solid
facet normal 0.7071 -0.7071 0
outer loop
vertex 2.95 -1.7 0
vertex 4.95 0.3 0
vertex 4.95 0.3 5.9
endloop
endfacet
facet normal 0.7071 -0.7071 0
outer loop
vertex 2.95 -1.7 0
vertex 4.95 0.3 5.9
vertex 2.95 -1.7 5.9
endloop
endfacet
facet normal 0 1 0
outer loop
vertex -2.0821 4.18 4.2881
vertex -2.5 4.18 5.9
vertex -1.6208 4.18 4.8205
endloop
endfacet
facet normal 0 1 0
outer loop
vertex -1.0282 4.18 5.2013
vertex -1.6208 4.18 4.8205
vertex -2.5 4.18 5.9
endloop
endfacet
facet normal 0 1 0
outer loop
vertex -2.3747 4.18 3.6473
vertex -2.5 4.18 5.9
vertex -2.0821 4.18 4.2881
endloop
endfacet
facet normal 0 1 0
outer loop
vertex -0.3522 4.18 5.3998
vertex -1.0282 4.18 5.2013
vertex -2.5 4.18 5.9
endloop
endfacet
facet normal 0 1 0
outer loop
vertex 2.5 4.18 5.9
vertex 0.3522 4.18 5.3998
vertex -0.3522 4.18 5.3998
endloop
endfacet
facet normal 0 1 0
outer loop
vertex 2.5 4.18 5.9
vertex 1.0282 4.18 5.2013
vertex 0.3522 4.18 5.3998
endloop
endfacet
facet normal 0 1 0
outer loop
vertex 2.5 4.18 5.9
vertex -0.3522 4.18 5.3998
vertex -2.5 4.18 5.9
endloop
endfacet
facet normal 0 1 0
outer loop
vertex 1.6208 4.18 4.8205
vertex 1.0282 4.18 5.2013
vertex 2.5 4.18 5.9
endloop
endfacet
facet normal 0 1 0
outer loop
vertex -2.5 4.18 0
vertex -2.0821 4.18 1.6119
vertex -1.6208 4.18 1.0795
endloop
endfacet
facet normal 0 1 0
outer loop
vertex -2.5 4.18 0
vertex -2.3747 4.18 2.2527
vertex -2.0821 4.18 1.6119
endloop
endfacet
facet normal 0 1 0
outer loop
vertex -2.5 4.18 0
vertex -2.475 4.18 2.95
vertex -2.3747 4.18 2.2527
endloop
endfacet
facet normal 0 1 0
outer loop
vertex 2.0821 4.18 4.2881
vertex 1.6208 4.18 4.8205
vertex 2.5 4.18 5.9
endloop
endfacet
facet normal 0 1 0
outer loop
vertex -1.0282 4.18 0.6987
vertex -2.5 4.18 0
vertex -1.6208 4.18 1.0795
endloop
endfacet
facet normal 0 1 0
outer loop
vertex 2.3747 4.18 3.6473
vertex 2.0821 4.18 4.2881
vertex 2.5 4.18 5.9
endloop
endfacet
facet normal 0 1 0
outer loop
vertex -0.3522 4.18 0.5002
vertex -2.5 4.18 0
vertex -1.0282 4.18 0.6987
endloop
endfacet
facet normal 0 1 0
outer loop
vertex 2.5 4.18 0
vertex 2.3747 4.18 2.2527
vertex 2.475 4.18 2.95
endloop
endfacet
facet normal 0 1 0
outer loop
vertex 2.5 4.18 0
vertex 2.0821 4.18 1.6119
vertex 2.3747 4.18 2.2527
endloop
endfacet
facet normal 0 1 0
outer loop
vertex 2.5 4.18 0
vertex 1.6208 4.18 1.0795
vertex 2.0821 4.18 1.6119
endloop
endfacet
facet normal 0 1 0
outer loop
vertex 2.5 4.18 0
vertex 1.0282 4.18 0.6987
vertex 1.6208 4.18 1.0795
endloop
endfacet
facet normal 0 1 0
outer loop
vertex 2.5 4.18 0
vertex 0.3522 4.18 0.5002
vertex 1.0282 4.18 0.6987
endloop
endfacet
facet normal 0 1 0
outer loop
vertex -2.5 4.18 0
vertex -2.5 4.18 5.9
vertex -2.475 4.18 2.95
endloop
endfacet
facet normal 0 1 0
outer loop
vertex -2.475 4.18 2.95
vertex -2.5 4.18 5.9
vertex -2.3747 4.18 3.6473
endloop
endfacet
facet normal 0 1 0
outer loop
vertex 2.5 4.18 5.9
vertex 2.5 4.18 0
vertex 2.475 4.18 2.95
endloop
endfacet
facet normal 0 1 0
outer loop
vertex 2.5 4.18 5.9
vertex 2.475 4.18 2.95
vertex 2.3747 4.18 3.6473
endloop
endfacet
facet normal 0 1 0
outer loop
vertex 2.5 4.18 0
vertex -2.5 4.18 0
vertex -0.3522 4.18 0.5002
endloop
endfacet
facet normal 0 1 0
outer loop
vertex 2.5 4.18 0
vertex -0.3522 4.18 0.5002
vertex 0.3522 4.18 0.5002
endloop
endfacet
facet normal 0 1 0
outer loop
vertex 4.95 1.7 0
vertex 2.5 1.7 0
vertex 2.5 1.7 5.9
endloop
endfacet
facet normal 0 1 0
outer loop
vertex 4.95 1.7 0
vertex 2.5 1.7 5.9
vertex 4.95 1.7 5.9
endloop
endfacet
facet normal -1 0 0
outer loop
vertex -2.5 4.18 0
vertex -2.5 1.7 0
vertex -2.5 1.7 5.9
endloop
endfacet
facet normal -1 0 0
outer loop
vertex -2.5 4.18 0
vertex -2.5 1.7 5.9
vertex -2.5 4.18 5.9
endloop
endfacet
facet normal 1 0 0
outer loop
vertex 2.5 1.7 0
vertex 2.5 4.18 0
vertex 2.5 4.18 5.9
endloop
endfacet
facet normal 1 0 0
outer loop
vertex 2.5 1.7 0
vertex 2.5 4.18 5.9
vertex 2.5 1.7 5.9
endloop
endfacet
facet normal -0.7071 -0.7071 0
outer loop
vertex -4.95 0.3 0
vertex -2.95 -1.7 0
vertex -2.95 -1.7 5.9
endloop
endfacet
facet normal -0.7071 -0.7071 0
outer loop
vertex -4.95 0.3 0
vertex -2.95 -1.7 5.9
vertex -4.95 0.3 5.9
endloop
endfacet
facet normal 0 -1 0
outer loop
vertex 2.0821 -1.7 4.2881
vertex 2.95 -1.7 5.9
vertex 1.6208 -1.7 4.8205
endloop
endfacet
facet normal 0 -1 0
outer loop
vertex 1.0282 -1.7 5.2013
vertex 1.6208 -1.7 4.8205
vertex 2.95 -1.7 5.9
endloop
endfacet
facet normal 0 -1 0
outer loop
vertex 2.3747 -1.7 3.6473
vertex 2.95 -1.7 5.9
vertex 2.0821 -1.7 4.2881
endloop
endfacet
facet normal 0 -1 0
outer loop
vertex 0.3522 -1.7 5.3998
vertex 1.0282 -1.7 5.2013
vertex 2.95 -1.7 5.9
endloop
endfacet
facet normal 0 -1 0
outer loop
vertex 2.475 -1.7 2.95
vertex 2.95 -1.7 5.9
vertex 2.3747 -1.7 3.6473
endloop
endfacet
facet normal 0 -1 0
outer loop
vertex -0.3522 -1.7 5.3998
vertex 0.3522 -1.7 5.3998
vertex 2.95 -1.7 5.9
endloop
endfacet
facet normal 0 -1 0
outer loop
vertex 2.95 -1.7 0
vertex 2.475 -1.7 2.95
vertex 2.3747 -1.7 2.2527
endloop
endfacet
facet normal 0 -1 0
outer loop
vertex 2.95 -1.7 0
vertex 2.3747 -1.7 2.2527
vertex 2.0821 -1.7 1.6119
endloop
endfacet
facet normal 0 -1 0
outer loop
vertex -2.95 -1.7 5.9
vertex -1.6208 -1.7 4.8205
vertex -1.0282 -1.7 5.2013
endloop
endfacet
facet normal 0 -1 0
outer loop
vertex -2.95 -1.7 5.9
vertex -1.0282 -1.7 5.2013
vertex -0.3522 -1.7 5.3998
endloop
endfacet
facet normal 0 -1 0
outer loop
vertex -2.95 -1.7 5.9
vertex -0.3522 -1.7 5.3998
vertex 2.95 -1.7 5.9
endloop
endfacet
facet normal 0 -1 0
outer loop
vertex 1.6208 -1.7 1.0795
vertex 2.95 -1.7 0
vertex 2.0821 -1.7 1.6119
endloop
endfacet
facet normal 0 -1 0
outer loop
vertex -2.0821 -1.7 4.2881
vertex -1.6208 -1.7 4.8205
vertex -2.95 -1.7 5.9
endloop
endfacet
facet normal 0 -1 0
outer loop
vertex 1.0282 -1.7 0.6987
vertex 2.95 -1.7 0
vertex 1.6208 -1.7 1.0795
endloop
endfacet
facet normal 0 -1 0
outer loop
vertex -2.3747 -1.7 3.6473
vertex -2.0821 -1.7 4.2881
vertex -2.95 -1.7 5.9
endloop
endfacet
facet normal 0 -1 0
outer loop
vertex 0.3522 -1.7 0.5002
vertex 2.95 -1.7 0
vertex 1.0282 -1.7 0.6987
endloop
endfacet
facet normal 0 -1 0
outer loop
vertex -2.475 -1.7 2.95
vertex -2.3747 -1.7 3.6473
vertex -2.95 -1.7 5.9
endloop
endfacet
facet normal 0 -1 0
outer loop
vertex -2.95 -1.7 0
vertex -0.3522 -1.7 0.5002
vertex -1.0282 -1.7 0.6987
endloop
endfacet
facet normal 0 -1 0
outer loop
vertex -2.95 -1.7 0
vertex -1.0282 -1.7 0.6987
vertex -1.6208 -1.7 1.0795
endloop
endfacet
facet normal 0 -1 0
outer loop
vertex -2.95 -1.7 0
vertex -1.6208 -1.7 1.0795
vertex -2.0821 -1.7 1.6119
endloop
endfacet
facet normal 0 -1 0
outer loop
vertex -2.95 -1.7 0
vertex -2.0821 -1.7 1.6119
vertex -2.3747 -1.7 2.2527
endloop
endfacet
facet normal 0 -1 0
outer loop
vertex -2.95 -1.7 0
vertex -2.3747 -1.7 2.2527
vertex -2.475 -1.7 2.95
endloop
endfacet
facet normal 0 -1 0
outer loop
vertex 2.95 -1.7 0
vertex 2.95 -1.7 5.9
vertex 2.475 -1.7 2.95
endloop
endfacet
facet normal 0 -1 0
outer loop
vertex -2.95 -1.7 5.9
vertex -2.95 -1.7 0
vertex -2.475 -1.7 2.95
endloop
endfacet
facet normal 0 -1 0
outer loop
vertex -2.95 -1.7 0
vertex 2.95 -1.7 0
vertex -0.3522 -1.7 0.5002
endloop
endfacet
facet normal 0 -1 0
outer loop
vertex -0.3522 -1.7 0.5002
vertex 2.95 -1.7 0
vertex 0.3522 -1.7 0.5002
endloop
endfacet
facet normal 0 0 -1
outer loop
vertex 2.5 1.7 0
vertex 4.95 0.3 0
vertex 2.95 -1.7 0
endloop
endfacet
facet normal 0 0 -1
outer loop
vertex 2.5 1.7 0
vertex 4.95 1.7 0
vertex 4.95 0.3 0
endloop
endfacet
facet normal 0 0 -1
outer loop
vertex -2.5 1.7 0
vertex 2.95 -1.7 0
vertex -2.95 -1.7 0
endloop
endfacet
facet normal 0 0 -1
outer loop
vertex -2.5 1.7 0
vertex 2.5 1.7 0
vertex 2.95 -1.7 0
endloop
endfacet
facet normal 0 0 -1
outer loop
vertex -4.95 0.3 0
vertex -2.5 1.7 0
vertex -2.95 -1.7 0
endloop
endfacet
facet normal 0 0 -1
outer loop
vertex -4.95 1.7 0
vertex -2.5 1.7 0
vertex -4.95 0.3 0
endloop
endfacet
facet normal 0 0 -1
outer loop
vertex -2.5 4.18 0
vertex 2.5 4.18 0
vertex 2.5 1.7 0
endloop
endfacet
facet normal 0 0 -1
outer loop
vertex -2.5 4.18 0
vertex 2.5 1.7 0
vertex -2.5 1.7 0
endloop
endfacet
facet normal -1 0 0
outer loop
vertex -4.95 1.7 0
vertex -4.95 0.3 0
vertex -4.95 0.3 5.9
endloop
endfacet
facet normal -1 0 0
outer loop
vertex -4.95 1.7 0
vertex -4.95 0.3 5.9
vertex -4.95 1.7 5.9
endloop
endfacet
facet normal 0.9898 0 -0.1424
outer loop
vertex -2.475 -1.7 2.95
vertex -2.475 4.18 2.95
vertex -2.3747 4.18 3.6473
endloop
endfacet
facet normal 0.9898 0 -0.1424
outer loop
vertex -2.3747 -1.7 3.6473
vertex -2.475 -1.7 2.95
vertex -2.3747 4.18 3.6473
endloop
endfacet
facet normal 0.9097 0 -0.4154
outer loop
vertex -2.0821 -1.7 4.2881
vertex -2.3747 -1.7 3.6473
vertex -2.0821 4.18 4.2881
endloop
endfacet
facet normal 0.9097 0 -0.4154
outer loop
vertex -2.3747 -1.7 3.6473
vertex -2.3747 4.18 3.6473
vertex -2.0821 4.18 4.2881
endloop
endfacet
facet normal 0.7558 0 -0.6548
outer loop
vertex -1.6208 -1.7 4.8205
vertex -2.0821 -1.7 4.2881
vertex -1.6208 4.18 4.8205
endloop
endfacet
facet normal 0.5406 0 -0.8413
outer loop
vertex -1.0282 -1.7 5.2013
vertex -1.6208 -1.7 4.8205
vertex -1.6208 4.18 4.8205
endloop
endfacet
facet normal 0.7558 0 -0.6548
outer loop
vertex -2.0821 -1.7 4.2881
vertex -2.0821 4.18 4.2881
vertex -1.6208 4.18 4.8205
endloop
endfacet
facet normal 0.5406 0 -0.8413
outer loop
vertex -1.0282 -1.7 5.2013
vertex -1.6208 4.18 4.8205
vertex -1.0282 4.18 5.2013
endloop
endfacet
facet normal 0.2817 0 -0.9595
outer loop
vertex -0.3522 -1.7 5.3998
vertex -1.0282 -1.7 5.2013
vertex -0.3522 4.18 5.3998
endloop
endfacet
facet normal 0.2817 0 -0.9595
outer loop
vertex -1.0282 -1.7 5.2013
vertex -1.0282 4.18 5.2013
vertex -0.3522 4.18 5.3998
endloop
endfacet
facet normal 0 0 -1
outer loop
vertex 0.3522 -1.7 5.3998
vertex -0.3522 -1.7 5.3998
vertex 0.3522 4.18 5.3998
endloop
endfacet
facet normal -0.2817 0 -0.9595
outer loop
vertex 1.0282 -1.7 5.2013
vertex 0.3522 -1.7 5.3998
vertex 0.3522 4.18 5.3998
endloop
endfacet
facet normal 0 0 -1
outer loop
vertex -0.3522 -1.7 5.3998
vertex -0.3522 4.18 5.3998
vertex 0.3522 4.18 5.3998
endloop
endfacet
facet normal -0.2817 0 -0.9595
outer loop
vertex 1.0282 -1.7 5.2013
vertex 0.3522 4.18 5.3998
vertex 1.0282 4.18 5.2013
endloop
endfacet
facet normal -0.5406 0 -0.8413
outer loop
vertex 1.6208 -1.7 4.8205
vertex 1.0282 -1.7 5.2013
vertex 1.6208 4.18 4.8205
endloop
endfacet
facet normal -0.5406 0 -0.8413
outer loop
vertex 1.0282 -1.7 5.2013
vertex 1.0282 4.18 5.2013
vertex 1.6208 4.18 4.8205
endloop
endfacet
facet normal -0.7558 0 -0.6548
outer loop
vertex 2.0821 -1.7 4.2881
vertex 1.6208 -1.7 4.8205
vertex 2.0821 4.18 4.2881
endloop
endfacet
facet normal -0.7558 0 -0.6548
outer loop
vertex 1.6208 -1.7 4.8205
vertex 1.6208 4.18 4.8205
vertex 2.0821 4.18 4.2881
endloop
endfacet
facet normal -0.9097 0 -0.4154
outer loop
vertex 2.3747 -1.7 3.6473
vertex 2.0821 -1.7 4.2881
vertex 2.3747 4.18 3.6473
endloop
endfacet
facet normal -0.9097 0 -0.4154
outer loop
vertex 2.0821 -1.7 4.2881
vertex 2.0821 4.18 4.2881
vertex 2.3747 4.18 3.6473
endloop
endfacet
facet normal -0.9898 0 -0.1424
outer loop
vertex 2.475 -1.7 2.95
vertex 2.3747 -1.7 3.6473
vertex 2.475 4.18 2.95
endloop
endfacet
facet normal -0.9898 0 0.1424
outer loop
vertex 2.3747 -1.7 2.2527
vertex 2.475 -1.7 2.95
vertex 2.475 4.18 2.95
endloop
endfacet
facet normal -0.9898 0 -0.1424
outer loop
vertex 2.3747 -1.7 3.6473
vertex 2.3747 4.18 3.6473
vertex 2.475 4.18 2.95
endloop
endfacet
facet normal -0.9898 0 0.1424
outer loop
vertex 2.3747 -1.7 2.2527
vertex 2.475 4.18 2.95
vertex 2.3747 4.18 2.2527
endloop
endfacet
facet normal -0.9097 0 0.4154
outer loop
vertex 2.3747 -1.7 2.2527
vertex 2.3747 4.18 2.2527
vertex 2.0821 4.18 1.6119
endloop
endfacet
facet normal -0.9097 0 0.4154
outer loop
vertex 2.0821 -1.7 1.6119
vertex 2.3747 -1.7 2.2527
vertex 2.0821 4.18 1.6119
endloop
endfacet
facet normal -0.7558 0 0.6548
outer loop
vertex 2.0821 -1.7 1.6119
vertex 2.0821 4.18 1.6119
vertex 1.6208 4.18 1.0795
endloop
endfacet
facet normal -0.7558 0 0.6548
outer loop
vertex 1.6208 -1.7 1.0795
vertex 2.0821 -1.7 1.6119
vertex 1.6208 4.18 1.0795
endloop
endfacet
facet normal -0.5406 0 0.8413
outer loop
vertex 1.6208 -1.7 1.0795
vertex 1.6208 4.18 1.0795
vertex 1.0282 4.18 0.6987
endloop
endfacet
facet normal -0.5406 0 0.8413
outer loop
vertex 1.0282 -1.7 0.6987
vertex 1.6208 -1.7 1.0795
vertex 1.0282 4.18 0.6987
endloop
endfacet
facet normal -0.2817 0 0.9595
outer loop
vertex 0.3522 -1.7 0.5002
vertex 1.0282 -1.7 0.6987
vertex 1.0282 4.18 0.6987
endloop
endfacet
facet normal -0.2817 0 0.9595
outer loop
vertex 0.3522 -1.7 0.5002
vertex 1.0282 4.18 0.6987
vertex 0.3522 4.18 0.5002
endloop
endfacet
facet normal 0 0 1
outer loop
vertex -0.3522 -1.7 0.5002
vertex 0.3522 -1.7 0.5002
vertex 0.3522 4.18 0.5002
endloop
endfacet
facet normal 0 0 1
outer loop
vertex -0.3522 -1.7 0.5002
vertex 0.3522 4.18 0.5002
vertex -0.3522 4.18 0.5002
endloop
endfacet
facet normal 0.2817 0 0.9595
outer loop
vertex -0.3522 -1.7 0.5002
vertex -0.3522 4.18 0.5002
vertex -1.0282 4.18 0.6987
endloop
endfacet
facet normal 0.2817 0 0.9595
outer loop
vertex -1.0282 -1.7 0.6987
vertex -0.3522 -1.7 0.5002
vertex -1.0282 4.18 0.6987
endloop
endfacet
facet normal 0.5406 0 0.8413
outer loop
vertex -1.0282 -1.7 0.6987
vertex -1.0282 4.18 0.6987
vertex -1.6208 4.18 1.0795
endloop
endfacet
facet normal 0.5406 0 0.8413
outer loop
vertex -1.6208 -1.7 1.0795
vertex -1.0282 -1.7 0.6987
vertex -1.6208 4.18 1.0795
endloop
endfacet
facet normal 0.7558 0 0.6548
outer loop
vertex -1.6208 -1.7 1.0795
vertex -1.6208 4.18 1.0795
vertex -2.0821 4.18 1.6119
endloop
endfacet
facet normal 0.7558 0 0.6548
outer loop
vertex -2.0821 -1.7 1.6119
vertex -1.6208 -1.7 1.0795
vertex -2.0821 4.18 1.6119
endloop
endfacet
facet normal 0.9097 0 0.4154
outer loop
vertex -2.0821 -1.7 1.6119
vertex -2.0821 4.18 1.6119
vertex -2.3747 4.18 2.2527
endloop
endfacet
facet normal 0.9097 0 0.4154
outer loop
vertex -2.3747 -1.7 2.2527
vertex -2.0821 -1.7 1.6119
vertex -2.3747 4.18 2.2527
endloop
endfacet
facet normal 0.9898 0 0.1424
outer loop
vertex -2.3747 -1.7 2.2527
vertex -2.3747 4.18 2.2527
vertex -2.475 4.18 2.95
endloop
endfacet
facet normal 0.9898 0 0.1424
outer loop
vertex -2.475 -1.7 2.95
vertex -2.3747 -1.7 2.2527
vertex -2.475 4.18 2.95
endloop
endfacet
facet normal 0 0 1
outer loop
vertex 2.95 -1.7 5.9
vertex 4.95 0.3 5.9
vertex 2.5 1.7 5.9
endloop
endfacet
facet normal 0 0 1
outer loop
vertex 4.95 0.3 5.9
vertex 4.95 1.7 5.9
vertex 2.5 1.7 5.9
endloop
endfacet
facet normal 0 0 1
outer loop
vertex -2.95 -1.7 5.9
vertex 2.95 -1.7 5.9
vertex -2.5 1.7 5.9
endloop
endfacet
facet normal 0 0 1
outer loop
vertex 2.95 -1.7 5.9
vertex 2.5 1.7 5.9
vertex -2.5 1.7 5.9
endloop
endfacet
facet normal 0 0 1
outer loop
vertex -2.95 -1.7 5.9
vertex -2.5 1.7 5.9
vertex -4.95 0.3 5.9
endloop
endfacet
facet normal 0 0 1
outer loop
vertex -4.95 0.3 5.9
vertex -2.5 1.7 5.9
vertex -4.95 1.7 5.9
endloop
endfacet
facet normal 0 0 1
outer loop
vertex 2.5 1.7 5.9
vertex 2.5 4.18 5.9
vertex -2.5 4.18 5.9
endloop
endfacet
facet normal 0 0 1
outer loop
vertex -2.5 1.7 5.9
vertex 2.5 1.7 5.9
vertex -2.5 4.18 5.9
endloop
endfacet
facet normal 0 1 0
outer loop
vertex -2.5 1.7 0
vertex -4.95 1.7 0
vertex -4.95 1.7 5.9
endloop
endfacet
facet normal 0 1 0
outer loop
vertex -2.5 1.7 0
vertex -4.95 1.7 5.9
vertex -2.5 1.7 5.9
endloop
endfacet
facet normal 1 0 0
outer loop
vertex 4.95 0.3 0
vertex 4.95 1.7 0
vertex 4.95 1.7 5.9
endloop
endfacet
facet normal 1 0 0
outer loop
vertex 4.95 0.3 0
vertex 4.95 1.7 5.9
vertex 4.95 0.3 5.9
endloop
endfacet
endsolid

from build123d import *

# Parameters (mm, degrees)
BOSS_EXTRUDE1_DEPTH = 5.9
SKETCH2_R           = 2.475
CUT_EXTRUDE7_DEPTH  = 10.689525272


with BuildPart() as part:
    # Sketch1 → Boss-Extrude1 (new body)
    with BuildSketch(Plane.XY):
        Polygon((4.95, 0.3), (2.95, -1.7), (-2.95, -1.7), (-4.95, 0.3), (-4.95, 1.7), (-2.5, 1.7), (-2.5, 4.18), (2.5, 4.18), (2.5, 1.7), (4.95, 1.7), align=None)
    extrude(amount=BOSS_EXTRUDE1_DEPTH)

    # Sketch2 → Cut-Extrude7 (cut, through all)
    with BuildSketch(Plane(origin=(0, 4.18, 0), x_dir=(1, 0, 0), z_dir=(0, 1, 0))):
        with Locations(Location((0, -2.95, 0), (0, 0, 180))):
            Circle(SKETCH2_R)
    extrude(amount=-CUT_EXTRUDE7_DEPTH, mode=Mode.SUBTRACT)


solid = part.part
